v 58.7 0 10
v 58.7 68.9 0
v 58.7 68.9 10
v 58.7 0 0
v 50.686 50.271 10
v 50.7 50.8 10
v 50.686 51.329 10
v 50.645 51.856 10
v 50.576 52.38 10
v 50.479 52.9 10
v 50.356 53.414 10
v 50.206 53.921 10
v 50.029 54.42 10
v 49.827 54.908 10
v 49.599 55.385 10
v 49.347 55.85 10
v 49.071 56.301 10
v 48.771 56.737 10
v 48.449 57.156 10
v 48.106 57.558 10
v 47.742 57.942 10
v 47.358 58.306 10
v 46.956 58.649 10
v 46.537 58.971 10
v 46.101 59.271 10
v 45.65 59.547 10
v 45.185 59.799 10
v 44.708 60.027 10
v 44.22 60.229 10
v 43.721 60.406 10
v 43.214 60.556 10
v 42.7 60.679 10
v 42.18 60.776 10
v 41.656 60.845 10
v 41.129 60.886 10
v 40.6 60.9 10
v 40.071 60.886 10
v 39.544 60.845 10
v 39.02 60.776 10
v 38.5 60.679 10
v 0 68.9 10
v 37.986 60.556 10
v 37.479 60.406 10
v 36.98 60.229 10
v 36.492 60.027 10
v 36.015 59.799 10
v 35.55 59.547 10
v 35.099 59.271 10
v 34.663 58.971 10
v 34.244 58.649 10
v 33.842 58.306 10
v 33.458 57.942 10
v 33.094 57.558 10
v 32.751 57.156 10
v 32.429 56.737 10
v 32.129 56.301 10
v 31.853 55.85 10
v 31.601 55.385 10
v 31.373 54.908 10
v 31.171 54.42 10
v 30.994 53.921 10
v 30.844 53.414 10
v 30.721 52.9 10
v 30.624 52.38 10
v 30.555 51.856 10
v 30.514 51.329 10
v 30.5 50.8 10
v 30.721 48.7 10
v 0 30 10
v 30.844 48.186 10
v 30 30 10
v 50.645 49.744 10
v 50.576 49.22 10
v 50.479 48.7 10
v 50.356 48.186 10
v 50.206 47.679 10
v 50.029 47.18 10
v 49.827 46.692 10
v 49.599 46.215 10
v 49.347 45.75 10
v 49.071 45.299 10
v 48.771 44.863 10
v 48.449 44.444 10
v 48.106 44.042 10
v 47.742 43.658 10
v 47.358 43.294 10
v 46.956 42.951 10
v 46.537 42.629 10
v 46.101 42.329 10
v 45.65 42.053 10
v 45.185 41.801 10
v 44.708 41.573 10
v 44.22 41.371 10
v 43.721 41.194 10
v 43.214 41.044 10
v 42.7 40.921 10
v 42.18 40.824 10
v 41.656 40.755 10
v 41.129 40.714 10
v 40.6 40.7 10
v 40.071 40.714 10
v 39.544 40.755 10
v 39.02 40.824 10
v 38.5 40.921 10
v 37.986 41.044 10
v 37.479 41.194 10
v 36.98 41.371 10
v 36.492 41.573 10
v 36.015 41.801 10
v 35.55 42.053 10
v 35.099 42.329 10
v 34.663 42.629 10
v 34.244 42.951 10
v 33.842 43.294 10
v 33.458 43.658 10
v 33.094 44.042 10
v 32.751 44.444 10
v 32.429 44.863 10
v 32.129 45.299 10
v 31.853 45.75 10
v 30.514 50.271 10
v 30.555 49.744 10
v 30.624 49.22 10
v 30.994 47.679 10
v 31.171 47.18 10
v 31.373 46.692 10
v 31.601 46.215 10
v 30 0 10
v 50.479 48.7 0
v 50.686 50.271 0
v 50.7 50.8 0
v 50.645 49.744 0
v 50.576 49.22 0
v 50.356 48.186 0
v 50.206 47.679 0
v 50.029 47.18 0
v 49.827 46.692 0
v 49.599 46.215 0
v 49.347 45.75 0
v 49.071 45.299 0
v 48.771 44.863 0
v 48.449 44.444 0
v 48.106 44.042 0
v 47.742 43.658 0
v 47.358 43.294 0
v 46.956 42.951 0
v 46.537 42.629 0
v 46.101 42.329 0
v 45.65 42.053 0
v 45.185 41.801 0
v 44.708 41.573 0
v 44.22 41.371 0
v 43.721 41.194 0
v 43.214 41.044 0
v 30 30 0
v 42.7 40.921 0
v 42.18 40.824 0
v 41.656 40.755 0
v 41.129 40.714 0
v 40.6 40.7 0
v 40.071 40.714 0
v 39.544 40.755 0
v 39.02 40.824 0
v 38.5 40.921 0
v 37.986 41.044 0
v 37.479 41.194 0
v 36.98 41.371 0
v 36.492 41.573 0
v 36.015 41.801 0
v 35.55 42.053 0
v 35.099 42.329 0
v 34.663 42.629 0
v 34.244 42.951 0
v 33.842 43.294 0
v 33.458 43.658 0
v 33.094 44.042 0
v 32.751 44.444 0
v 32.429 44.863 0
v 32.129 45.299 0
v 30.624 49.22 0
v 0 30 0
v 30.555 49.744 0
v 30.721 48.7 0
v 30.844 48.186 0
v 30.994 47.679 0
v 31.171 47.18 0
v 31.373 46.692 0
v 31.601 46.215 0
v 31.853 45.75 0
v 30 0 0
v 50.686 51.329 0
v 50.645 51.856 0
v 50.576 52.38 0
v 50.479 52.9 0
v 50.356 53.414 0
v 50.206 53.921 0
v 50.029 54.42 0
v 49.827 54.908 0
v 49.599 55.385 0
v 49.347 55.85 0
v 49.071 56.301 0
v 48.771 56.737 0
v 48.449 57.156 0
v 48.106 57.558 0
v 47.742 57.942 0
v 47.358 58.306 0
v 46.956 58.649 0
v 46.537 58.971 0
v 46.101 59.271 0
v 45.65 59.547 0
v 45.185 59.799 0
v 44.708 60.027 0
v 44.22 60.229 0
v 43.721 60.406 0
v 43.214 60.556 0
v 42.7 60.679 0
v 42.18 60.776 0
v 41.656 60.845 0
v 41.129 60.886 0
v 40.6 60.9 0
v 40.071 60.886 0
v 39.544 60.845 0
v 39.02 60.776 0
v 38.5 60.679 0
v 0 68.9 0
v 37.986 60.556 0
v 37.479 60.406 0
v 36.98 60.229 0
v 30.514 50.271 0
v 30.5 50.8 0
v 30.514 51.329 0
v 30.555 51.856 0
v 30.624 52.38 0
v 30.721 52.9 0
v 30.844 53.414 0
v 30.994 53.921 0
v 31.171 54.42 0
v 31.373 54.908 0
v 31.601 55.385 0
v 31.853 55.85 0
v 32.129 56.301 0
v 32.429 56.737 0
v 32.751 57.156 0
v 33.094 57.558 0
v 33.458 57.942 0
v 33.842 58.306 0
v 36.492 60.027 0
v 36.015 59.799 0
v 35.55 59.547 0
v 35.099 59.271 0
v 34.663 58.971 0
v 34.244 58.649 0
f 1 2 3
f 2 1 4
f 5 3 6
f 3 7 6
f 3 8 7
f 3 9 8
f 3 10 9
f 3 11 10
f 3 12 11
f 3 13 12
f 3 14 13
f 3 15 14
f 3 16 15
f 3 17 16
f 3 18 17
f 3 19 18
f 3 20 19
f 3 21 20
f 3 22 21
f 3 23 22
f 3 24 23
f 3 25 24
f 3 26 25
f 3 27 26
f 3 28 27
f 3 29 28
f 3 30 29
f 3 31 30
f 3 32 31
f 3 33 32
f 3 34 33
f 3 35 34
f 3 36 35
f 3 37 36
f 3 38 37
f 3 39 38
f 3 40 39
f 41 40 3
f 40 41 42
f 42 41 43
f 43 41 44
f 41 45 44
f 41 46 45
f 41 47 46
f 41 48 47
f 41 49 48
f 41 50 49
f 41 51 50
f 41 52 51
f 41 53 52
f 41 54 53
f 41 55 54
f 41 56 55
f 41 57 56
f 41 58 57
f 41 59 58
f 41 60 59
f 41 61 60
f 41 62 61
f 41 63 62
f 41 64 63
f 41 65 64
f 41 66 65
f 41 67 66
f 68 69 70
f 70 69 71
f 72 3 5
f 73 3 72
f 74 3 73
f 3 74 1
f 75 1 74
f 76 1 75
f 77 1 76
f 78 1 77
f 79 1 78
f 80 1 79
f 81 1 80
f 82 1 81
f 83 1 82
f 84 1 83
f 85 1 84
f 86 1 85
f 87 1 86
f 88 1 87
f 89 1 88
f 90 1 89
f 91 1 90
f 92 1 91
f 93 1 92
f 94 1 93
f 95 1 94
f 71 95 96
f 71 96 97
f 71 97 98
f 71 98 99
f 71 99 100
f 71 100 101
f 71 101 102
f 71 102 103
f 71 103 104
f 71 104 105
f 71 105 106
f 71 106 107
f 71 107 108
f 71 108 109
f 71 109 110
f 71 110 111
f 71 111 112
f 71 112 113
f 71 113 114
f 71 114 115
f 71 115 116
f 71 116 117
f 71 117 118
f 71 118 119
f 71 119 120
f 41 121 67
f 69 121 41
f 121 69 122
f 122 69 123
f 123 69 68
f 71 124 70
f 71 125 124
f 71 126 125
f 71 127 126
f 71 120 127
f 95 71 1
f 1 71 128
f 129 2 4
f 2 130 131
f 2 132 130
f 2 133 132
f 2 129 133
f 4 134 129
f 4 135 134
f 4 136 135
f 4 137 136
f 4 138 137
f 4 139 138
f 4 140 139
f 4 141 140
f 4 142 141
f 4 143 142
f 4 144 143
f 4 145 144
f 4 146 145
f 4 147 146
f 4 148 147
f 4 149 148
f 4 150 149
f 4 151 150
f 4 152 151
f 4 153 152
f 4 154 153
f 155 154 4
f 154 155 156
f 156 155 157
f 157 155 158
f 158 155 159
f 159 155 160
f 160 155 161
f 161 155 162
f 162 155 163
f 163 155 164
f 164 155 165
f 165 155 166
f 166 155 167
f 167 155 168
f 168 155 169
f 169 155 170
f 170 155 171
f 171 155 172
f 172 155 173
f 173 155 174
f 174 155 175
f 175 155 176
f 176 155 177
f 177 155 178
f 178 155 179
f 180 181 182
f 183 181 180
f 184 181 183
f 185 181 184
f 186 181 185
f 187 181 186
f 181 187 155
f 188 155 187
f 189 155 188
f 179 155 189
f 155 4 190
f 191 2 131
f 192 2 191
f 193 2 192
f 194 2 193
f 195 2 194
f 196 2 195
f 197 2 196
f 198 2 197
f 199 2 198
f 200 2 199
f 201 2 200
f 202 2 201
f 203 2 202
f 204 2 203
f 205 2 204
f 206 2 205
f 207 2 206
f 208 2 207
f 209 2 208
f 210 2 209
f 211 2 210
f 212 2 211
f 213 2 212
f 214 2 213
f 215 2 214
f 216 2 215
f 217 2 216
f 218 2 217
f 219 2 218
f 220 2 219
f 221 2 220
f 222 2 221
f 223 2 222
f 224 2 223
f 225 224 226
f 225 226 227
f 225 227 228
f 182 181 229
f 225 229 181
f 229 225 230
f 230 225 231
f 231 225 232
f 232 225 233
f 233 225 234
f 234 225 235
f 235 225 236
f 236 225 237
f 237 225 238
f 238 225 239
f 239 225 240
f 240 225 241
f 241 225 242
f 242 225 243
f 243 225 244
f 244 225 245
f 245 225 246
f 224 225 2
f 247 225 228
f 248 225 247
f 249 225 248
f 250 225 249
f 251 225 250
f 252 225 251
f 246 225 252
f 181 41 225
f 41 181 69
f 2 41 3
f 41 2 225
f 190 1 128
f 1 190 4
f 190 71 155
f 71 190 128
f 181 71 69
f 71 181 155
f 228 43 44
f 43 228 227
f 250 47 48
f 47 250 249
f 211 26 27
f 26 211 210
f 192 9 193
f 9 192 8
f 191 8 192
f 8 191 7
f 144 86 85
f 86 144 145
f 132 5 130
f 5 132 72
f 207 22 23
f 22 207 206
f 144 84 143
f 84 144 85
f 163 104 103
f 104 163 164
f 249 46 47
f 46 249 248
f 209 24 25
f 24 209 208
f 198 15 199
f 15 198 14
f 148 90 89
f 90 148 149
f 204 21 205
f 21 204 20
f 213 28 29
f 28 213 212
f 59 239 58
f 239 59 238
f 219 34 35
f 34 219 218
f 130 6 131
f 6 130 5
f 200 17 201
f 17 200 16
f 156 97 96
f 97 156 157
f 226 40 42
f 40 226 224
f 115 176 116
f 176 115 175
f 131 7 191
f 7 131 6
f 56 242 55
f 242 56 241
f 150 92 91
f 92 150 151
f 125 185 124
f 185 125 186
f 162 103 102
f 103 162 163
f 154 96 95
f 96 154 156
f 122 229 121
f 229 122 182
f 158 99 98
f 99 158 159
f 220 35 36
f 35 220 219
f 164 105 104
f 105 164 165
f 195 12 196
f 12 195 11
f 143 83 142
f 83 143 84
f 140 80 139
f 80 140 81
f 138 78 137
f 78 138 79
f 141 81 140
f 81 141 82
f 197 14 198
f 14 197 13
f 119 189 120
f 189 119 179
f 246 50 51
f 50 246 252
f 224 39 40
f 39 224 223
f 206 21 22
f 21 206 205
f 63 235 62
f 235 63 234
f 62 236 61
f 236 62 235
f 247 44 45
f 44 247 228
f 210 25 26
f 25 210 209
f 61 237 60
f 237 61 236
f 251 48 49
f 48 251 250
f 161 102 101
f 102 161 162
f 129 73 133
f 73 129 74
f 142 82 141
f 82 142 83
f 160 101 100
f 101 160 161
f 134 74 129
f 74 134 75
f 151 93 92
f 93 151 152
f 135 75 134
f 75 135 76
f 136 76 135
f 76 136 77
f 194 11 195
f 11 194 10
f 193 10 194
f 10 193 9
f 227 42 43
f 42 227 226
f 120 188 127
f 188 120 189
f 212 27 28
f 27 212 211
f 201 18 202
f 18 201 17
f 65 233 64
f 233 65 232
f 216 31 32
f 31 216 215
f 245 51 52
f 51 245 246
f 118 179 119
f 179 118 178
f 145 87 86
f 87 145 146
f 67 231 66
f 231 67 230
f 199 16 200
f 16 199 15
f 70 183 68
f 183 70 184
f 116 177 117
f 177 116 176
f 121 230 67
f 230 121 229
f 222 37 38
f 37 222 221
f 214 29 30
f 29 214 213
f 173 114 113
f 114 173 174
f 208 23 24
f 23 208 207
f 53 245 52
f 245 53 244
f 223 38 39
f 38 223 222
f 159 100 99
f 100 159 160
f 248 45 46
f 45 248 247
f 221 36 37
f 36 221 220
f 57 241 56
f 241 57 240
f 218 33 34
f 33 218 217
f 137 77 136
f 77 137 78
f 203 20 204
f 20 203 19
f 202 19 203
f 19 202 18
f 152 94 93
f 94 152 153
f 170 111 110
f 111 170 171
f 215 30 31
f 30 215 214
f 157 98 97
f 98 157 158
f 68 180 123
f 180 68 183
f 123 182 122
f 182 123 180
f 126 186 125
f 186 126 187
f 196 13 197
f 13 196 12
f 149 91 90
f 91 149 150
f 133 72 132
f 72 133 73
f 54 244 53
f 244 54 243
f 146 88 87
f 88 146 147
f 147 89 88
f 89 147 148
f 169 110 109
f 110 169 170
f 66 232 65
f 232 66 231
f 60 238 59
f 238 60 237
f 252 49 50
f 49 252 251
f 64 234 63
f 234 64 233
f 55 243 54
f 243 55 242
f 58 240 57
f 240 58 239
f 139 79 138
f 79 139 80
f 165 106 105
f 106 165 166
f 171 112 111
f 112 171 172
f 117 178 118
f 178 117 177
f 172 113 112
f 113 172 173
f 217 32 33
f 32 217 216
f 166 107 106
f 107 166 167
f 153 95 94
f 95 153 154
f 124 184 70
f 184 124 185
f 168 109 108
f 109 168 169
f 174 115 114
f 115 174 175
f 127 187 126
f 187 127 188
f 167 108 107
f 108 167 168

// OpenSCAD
$fn=120;

height=10;
cut=30;
diameter=20.2;
padding=8;
centerToEdge = 21.2; // 21.2 or 69

xShift = -10; // we will shift + or - 10

distanceX = 21 / 2 + xShift;
distanceY = centerToEdge - 21 / 2; 

width=distanceX+diameter+cut+padding;
depth=distanceY+diameter+cut+padding;

difference() {
  cube([width,depth,height]);
  translate([0,0,-0.5]) cube([cut,cut,height+1]);
  translate([cut+distanceX+diameter/2,cut+distanceY+diameter/2,-0.5]) cylinder(d=diameter,h=height+1);

}
